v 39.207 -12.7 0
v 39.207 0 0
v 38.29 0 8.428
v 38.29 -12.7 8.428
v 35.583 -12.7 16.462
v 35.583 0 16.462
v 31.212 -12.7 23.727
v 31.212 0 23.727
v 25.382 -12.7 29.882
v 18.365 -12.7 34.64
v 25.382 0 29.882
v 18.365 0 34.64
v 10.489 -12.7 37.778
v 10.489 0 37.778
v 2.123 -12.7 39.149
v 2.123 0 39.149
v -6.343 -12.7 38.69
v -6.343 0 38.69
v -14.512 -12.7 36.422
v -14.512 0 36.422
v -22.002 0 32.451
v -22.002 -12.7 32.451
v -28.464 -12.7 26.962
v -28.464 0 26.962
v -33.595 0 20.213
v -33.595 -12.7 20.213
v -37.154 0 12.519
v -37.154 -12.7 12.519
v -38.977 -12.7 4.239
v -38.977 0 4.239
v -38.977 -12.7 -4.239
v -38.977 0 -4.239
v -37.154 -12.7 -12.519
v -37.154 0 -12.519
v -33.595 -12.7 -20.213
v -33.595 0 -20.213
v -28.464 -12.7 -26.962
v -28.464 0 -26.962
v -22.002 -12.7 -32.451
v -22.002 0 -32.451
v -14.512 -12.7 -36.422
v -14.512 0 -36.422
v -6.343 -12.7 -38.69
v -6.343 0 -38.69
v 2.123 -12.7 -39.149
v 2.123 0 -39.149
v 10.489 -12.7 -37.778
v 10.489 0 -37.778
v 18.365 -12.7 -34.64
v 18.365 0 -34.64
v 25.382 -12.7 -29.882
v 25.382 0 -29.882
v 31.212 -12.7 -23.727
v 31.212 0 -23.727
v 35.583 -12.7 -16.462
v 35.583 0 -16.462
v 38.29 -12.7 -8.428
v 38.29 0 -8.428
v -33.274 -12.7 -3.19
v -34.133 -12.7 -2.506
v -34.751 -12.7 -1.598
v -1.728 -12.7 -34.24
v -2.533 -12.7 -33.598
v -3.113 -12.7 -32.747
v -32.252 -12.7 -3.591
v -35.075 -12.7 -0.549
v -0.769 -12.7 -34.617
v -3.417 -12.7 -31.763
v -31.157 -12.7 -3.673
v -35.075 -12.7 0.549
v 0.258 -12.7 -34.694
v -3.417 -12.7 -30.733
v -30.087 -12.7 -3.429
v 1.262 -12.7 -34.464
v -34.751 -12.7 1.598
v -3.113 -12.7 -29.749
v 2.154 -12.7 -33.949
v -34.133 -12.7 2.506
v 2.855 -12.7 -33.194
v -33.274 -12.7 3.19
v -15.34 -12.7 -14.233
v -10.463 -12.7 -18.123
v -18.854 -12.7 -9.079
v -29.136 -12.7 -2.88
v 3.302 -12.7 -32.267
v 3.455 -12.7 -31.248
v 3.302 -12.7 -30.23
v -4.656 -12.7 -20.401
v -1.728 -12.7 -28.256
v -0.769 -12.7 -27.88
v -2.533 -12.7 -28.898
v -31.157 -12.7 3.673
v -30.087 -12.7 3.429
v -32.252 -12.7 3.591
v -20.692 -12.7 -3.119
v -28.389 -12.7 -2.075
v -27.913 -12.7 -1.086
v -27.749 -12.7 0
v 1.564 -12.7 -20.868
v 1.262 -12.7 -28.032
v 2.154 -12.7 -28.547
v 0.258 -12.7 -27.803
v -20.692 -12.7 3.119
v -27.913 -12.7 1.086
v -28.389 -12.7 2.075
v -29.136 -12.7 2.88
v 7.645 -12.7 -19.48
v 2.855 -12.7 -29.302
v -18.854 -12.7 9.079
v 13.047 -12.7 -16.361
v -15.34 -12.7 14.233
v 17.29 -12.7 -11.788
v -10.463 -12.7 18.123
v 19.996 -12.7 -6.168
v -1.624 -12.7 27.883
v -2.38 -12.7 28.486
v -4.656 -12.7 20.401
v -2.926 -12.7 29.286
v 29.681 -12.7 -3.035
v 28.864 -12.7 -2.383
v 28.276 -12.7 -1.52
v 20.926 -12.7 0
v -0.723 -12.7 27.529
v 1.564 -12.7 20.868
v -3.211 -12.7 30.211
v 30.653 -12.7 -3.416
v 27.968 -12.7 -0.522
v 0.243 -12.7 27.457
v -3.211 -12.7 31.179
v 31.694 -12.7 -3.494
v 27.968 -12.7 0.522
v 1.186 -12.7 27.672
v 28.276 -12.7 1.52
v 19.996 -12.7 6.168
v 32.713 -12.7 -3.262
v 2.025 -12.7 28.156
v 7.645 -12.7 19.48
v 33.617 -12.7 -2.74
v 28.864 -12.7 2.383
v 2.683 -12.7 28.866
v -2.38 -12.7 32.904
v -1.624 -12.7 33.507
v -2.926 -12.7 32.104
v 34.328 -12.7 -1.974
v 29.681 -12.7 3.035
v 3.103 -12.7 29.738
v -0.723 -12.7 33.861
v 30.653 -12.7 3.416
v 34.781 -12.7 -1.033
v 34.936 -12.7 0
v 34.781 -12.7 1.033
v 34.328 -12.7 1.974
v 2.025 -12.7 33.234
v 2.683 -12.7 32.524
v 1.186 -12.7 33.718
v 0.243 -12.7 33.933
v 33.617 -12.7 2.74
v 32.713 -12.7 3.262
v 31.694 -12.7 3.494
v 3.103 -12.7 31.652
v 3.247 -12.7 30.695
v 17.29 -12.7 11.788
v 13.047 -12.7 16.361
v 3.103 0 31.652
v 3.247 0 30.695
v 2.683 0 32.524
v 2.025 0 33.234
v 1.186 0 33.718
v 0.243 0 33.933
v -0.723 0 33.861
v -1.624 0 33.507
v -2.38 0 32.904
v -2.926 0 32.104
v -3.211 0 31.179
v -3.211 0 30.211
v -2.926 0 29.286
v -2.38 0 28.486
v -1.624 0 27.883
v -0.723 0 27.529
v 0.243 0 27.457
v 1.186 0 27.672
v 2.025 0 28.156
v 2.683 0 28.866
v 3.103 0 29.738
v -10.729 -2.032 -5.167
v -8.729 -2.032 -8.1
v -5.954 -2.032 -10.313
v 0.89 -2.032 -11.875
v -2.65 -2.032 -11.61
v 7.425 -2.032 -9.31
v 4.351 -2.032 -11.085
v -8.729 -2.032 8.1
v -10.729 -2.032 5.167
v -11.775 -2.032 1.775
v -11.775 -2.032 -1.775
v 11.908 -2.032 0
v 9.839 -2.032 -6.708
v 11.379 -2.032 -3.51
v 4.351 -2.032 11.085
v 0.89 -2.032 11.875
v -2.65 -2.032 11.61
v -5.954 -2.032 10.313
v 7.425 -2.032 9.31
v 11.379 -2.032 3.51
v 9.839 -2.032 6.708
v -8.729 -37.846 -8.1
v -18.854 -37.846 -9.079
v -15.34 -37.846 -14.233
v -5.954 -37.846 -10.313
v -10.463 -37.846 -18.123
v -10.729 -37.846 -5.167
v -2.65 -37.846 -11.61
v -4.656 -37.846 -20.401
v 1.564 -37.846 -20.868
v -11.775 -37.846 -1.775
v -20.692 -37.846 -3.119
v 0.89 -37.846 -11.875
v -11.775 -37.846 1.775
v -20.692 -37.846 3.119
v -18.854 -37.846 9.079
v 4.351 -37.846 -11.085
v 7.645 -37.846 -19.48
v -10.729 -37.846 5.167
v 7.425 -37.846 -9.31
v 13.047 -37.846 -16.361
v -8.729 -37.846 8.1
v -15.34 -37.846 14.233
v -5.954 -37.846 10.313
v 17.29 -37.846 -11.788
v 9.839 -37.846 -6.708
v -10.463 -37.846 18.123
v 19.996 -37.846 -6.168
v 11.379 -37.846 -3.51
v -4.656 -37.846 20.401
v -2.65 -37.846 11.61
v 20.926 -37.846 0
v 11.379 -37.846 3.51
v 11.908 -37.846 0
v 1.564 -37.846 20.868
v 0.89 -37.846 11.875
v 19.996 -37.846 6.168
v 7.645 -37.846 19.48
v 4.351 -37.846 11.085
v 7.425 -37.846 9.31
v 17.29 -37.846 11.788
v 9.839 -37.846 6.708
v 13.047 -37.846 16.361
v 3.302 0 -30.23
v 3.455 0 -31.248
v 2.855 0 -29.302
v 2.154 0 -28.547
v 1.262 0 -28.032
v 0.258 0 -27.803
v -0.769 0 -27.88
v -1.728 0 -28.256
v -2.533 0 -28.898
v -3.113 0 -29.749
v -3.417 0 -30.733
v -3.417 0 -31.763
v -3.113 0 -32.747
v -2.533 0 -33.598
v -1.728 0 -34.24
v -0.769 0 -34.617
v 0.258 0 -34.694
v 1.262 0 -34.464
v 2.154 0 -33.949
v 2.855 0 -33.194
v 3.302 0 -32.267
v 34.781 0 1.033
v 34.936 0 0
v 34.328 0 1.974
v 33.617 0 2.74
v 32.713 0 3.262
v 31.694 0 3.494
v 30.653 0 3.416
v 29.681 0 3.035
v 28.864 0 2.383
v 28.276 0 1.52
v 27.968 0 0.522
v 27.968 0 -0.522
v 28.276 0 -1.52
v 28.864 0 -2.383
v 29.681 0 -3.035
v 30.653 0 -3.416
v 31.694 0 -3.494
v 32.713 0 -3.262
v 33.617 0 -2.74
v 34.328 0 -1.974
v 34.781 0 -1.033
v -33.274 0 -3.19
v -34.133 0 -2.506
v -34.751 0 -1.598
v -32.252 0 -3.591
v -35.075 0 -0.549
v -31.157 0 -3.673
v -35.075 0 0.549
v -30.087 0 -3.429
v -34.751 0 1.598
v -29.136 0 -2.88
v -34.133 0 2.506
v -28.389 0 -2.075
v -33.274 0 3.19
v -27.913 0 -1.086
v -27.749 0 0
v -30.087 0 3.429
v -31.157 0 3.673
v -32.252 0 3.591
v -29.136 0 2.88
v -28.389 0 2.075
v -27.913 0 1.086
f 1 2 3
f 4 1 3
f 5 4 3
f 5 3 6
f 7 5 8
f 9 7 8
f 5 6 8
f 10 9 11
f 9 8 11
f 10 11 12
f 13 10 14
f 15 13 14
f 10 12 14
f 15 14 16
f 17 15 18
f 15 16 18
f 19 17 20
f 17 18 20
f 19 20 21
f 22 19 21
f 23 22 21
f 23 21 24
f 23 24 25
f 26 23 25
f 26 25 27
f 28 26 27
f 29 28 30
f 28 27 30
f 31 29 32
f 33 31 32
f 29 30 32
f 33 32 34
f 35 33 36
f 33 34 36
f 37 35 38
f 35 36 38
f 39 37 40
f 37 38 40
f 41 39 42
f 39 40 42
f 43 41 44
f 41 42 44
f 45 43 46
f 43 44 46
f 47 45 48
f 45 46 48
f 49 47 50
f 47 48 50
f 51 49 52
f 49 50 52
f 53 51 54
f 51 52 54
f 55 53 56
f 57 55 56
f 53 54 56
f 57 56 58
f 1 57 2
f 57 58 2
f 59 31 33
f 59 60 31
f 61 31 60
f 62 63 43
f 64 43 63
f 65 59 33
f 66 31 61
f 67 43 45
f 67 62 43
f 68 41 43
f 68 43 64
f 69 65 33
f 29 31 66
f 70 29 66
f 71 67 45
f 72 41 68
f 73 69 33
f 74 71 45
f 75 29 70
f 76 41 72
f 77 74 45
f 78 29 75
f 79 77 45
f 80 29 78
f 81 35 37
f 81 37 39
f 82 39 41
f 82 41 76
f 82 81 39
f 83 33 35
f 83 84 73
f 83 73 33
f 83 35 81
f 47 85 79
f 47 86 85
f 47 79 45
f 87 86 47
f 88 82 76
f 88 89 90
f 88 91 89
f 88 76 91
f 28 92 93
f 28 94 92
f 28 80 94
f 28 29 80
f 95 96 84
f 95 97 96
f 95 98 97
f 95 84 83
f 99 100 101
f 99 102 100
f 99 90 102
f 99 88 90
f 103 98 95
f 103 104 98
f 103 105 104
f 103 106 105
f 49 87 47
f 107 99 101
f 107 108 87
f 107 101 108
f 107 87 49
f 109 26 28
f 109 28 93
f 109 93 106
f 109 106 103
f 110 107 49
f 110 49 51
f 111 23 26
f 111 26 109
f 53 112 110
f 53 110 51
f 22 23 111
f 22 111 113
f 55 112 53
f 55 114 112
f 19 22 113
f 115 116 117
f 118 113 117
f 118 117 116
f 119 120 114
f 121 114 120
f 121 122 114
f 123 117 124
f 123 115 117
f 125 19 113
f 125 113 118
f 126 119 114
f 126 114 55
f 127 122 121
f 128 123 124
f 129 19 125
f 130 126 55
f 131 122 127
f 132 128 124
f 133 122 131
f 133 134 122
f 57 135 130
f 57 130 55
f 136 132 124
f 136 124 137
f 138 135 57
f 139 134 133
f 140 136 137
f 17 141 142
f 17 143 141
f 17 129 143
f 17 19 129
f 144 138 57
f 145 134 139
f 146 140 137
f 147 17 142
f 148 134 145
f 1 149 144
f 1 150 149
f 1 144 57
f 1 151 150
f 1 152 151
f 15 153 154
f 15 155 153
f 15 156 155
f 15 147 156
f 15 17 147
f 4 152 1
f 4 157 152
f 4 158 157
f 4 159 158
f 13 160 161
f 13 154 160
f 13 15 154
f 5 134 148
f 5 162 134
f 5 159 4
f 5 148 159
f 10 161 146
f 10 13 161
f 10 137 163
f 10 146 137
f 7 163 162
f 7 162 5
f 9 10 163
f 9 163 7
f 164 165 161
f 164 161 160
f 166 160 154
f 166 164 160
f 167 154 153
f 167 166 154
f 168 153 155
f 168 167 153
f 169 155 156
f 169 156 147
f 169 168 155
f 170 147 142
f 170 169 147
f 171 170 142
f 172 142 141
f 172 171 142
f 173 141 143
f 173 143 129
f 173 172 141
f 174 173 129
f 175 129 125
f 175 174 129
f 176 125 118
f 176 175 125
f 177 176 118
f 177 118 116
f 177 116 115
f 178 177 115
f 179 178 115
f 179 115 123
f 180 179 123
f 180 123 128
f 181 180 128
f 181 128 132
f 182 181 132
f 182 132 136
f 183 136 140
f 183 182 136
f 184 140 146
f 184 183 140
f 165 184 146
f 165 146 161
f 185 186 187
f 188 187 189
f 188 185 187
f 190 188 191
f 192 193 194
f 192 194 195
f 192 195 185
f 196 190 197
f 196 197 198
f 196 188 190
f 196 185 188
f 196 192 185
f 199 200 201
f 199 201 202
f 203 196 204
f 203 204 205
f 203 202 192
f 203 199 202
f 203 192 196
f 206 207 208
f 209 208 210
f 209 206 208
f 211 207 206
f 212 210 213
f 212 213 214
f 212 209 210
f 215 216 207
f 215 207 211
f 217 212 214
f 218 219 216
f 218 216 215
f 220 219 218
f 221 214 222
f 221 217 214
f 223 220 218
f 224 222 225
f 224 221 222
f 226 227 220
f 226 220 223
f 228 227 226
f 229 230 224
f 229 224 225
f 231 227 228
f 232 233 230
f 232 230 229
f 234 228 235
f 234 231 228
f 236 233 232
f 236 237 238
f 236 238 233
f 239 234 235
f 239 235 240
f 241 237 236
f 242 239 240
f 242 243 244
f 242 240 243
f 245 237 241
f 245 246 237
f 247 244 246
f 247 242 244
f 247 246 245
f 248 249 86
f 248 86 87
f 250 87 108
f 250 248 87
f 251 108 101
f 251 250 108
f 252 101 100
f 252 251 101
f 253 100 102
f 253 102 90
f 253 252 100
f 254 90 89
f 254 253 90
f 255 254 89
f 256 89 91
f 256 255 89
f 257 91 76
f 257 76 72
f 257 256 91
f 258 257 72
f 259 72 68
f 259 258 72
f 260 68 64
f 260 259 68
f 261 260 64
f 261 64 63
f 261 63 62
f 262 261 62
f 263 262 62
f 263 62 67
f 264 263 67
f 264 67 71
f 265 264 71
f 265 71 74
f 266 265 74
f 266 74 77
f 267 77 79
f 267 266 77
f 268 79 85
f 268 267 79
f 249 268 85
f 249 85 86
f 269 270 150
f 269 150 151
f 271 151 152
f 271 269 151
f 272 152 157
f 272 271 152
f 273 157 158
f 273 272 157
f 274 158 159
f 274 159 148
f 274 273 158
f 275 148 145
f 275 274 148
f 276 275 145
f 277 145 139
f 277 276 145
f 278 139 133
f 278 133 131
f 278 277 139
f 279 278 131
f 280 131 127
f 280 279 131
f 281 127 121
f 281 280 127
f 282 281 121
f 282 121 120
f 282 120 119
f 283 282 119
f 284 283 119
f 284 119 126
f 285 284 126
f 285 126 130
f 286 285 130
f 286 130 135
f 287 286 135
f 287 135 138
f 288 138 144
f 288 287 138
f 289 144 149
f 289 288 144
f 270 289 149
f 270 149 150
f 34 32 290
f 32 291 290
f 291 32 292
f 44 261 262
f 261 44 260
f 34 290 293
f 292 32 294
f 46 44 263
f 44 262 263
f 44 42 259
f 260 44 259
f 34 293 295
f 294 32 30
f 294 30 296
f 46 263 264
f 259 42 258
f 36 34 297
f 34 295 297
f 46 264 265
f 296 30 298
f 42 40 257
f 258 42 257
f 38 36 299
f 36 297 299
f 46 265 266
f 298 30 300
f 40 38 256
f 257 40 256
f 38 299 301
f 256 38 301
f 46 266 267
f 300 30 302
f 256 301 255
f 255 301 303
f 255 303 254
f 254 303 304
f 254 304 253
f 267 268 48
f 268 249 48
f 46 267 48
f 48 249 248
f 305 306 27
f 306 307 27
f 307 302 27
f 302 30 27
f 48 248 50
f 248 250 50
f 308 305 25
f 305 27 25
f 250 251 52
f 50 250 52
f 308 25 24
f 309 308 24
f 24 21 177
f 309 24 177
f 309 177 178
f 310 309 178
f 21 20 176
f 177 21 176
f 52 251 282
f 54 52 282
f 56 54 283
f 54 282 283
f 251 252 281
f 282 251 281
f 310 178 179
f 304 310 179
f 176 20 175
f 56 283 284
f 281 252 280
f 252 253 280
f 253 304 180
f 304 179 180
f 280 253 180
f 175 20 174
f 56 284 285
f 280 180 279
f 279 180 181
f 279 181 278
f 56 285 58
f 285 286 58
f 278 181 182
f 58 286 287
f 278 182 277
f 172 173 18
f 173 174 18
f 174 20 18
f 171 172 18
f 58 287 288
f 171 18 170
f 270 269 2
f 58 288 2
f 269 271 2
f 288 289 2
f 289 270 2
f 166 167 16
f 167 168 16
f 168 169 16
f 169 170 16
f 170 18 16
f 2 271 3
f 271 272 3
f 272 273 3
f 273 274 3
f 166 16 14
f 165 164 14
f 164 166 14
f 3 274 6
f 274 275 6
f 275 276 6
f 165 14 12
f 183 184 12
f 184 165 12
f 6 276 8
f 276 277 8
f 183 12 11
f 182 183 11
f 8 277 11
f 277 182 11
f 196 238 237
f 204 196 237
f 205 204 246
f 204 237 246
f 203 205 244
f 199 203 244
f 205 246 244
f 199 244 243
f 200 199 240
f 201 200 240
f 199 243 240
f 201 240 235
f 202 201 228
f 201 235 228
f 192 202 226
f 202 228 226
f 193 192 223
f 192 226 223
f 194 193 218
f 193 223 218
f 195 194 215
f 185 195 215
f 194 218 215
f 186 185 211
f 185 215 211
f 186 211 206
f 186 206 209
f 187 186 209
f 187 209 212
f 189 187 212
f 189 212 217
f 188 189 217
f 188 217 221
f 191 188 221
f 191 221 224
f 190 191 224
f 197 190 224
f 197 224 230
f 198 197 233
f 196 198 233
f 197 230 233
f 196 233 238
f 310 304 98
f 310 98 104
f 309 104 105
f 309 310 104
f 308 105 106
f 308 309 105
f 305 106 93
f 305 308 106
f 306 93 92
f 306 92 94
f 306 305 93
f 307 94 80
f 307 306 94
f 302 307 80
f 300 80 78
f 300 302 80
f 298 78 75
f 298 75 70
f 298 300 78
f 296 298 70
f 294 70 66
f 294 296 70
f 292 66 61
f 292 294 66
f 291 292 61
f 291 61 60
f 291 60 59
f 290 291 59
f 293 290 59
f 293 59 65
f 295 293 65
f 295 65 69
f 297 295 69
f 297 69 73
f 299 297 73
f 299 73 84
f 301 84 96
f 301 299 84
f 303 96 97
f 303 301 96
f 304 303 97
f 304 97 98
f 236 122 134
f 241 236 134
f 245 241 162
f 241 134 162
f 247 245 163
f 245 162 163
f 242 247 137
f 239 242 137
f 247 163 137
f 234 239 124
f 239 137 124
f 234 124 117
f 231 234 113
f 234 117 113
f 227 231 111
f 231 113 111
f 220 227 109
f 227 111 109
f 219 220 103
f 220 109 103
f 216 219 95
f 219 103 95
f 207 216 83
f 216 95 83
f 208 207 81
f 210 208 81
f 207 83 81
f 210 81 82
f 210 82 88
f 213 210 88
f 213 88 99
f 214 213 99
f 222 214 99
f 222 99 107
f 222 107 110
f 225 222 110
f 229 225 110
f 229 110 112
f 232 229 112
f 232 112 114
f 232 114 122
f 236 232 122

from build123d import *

# Parameters (mm, degrees)
F0_R     = 39.206734
F0_R_2   = 3.455117
F0_R_3   = 3.683637
F0_R_4   = 20.926103
F0_R_5   = 3.503953
F0_R_6   = 3.247211
F1_DEPTH = 12.7
F2_DEPTH = 37.846
F3_R     = 11.90838
F4_DEPTH = 35.814


with BuildPart() as f1:
    # F0 (on Front) → F1 (new body)
    with BuildSketch(Plane.XZ):
        Circle(F0_R)
        with Locations((0, -31.248145)):
            Circle(F0_R_2, mode=Mode.SUBTRACT)
        with Locations((-31.432498, 0)):
            Circle(F0_R_3, mode=Mode.SUBTRACT)
        Circle(F0_R_4, mode=Mode.SUBTRACT)
        with Locations((31.432498, 0)):
            Circle(F0_R_5, mode=Mode.SUBTRACT)
        with Locations((0, 30.695081)):
            Circle(F0_R_6, mode=Mode.SUBTRACT)
    extrude(amount=F1_DEPTH)

    # F0 (on Front) → F2 (join)
    with BuildSketch(Plane.XZ):
        Circle(F0_R_4)
    extrude(amount=F2_DEPTH)

    # F3 (on face) → F4 (cut)
    with BuildSketch(Plane.XZ.offset(37.846)):
        Circle(F3_R)
    extrude(amount=-F4_DEPTH, mode=Mode.SUBTRACT)


solid = f1.part
